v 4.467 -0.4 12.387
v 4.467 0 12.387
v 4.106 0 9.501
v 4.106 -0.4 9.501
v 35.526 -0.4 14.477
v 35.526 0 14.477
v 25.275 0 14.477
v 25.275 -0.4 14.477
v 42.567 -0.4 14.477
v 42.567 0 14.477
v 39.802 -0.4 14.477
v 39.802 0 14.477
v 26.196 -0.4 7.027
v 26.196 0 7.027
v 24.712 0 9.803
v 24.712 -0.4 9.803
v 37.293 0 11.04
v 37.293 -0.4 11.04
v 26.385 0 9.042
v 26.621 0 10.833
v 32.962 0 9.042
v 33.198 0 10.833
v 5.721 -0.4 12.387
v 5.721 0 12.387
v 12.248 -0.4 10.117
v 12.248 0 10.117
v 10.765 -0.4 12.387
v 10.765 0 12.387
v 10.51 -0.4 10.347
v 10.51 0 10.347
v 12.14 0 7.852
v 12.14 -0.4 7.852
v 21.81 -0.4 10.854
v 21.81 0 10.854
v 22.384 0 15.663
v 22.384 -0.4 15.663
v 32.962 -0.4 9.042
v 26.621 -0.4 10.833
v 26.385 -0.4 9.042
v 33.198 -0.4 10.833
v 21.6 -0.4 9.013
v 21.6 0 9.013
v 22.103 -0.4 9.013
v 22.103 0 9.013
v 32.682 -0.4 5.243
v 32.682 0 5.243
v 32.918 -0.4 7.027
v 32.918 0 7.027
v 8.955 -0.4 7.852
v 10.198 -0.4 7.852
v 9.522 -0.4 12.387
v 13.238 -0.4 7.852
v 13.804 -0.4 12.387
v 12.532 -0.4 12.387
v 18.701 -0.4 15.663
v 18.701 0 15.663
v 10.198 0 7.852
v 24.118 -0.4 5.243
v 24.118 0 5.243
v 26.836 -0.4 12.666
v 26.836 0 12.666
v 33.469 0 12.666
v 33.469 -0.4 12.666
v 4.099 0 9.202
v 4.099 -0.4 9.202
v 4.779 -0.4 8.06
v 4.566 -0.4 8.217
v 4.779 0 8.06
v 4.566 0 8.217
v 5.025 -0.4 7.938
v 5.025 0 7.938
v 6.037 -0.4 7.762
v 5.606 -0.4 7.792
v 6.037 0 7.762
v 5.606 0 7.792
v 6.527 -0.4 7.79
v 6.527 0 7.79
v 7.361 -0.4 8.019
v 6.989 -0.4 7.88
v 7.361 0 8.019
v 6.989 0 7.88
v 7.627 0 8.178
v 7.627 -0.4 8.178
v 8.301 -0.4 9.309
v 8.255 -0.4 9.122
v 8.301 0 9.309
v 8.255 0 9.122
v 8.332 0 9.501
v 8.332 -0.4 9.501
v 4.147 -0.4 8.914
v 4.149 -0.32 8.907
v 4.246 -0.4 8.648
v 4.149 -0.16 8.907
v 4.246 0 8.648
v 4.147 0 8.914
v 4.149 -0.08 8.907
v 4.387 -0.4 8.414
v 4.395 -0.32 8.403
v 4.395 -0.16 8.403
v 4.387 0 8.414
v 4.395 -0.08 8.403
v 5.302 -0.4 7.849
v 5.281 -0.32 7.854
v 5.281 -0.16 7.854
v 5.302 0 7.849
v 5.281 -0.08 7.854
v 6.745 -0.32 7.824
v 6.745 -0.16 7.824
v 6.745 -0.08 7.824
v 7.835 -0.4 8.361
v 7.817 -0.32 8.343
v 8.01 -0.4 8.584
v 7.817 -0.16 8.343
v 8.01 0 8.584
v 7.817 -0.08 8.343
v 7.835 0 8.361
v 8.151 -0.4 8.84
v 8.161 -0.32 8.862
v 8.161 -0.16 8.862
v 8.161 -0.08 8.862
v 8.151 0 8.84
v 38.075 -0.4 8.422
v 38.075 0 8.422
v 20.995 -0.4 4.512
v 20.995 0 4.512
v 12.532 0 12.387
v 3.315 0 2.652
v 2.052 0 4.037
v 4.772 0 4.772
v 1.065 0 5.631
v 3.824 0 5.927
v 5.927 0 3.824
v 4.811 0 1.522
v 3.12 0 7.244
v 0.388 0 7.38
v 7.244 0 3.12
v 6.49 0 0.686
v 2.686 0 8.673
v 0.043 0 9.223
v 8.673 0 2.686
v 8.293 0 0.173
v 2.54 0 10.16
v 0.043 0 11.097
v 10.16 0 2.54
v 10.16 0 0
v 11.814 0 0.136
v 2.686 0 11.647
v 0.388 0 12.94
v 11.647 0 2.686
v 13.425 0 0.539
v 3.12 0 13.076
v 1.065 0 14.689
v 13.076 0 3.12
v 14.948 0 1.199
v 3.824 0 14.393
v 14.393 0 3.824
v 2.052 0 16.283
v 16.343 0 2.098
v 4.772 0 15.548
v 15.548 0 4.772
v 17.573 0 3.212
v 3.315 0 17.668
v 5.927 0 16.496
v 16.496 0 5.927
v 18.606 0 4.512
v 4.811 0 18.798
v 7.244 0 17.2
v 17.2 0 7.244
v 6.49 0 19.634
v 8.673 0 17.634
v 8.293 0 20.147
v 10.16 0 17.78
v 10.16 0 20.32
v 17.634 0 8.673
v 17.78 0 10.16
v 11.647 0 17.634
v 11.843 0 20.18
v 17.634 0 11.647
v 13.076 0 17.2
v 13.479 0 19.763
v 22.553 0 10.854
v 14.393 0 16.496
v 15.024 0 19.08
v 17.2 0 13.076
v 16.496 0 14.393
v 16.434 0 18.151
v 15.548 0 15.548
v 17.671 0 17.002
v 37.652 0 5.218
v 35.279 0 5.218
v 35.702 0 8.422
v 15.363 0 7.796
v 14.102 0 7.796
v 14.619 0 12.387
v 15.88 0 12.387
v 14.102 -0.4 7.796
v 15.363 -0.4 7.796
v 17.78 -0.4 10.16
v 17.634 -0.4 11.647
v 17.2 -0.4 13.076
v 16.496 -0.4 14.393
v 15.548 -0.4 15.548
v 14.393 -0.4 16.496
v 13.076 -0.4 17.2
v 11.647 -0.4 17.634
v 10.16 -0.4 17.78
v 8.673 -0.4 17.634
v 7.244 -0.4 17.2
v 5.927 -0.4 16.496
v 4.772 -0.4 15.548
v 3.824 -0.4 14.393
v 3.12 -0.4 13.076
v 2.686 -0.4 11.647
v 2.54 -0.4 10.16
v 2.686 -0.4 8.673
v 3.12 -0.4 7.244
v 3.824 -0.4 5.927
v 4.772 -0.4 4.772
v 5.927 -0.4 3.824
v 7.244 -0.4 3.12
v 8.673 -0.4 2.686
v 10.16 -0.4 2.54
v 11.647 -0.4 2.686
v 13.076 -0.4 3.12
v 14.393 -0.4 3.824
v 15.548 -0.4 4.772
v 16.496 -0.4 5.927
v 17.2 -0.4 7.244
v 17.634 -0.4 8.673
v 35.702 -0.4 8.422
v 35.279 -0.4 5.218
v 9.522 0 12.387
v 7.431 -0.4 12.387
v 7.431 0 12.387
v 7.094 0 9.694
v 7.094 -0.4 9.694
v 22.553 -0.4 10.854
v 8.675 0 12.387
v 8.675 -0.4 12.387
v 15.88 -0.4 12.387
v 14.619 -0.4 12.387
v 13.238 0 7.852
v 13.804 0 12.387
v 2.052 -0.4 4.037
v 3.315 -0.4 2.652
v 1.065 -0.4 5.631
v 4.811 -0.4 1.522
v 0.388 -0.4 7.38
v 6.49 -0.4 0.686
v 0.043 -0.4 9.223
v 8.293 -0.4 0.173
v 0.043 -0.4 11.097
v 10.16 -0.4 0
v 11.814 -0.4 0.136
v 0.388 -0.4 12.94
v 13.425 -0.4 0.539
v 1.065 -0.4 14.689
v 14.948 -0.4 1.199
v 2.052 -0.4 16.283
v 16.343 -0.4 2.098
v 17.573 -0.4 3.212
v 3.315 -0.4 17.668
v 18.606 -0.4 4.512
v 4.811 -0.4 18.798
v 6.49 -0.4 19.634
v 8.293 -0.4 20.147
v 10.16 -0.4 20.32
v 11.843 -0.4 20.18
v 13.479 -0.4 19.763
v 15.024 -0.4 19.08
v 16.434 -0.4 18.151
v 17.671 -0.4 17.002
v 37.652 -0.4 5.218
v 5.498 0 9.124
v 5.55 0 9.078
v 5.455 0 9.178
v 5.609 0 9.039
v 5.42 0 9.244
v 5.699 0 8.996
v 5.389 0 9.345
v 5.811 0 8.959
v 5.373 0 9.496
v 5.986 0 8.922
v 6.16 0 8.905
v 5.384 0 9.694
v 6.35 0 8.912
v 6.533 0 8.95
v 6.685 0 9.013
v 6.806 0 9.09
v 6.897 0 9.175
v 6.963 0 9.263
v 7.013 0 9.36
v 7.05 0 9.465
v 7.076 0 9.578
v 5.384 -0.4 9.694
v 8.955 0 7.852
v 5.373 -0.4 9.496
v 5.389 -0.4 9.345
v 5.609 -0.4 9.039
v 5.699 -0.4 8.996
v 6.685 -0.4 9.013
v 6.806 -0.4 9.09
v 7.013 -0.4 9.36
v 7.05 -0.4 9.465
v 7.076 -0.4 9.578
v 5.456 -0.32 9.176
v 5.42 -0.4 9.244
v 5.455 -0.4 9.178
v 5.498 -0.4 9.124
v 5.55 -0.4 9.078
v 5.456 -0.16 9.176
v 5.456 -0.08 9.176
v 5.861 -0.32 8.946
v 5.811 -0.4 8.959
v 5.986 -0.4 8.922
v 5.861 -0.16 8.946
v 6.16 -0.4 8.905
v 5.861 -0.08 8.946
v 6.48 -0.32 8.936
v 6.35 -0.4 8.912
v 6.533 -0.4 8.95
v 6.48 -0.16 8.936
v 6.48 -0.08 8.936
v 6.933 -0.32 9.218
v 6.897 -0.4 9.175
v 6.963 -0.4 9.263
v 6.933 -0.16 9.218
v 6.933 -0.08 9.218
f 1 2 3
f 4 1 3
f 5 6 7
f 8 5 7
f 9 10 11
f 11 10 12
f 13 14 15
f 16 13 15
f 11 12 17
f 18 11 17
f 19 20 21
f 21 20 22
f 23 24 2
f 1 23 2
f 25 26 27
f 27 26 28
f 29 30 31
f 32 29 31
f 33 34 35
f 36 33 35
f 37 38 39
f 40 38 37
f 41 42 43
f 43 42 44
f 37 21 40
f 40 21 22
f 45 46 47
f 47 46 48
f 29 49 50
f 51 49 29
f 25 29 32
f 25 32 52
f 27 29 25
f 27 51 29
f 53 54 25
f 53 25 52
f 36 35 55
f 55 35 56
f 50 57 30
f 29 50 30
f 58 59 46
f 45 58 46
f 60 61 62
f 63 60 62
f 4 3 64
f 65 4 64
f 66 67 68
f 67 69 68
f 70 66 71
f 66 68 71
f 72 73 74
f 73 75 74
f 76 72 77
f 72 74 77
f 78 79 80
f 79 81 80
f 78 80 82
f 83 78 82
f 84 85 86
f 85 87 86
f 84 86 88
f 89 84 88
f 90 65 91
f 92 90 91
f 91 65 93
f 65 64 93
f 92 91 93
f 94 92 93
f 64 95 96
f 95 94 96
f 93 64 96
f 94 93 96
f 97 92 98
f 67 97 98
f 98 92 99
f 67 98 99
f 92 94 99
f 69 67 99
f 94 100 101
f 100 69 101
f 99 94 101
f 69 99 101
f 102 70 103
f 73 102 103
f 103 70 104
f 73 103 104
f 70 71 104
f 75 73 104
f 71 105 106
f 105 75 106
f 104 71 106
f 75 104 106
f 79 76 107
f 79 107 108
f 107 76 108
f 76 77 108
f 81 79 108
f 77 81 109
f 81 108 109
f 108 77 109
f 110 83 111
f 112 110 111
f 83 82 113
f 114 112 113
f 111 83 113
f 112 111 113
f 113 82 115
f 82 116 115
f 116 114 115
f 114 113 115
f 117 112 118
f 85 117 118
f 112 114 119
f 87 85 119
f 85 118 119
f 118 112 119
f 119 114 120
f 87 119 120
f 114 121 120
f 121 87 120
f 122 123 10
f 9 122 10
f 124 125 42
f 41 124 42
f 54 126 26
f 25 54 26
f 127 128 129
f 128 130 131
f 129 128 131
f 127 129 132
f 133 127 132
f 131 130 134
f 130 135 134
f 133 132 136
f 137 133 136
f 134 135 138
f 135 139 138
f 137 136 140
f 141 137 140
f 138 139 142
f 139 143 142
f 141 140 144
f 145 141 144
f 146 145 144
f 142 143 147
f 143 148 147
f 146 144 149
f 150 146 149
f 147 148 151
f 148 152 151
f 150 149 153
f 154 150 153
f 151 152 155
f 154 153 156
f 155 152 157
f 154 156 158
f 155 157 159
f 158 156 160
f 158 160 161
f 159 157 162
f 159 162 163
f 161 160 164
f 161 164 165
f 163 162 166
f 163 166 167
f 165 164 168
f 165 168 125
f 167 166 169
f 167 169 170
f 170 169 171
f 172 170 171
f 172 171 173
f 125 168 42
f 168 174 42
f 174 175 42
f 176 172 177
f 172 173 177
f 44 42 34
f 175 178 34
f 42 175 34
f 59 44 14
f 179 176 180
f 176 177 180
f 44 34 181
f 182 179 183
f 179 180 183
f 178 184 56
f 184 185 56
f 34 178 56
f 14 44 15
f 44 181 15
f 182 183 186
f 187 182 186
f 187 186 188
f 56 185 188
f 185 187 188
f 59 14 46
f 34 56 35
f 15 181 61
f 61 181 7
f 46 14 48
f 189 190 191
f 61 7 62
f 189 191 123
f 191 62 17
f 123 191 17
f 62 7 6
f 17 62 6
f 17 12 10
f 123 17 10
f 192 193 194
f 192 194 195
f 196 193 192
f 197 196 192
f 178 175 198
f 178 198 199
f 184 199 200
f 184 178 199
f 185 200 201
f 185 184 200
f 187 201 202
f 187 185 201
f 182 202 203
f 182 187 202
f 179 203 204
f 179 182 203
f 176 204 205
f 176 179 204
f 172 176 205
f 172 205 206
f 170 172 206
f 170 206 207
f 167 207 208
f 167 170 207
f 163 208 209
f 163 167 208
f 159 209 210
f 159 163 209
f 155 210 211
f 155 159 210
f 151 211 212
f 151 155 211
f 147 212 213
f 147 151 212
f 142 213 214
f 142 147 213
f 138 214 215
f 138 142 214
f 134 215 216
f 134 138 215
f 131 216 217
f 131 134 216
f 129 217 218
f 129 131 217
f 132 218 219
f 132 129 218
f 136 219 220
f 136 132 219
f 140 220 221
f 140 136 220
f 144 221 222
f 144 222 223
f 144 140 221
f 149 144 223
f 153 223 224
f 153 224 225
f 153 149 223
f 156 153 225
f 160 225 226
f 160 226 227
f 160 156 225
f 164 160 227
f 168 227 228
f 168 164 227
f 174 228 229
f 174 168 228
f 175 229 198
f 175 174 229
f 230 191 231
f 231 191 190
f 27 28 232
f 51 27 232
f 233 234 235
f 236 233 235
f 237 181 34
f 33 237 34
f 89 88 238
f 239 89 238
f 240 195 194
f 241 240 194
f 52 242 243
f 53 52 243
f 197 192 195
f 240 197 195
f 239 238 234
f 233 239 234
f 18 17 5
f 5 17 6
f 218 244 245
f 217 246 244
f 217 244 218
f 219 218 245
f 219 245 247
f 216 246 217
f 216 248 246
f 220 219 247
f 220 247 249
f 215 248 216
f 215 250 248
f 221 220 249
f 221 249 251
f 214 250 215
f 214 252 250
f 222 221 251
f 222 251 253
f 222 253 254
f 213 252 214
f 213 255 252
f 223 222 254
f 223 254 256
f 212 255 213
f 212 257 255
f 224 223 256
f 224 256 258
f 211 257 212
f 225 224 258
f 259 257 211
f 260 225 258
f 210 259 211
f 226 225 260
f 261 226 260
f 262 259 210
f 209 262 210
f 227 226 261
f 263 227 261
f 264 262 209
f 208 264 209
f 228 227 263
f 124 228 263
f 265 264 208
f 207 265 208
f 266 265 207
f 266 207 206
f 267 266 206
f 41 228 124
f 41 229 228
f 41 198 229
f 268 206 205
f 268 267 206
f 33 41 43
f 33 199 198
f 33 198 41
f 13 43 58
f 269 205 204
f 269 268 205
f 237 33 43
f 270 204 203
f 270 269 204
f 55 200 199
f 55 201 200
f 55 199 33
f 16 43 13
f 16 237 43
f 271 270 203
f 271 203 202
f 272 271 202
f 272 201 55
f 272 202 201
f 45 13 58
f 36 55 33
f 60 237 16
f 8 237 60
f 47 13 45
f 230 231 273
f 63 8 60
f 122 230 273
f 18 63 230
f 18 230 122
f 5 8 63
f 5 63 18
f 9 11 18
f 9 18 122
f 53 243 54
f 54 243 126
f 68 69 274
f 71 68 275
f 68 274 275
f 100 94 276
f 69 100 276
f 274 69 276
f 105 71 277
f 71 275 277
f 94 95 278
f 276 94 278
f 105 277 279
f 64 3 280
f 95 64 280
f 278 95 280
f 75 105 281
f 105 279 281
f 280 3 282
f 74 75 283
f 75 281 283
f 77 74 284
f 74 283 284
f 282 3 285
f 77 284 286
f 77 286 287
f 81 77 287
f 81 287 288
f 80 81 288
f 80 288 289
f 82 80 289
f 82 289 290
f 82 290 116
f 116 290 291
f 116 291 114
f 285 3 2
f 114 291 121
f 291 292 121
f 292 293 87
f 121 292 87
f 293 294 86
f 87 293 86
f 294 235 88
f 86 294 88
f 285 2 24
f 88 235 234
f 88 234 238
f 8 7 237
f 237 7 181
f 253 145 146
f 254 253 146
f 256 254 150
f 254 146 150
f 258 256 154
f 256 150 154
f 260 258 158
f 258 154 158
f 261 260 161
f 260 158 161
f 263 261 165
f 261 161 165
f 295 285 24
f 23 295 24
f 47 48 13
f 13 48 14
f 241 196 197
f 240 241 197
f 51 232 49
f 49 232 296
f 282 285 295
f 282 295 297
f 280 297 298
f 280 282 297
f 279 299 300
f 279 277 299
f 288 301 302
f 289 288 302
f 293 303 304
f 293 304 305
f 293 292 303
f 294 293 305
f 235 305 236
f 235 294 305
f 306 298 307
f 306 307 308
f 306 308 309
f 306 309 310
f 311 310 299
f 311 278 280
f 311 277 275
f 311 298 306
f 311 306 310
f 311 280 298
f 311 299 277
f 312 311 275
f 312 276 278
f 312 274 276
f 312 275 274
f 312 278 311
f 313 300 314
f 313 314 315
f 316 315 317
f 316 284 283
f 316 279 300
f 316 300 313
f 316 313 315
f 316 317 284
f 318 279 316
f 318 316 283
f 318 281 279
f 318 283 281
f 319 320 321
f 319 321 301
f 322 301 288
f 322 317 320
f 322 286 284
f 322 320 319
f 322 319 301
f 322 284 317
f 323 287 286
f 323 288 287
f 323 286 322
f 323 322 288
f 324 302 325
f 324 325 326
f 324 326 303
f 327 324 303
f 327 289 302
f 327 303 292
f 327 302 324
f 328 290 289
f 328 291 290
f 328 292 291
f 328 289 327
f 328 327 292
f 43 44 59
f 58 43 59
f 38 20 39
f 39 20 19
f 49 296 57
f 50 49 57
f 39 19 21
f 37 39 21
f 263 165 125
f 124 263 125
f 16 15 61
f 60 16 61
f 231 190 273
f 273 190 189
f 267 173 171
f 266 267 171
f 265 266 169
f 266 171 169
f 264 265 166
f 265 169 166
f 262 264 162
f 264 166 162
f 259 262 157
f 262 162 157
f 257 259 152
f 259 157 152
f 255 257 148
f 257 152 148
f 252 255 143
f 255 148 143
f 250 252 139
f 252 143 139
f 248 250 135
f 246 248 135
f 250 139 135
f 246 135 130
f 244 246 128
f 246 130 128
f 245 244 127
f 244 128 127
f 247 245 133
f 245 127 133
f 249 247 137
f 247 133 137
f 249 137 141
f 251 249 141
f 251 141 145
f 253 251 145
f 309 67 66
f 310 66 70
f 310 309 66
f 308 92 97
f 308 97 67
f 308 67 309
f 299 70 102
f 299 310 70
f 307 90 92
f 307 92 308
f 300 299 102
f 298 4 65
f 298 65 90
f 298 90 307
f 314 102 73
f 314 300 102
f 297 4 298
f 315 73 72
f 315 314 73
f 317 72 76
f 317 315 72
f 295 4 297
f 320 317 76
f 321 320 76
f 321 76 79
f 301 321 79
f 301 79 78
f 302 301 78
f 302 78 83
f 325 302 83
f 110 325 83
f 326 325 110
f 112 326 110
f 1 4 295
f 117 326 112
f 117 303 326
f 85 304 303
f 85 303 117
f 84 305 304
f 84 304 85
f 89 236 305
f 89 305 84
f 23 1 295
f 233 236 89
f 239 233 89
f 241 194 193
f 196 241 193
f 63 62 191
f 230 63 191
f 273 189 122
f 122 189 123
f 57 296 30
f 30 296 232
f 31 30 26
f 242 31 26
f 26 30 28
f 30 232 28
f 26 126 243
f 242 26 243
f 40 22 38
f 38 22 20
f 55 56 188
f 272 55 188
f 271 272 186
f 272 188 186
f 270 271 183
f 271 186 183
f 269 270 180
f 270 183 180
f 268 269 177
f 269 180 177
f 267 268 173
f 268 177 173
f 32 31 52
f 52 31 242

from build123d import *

# Parameters (mm, degrees)
F2_DEPTH = 1
F1_R     = 19.05
F3_SCALE = 0.4


with BuildPart() as f2:
    # F1 (on Front) → F2 (new body)
    with BuildSketch(Plane.XZ):
        Polygon((82.9961871263, 27.0818155259), (66.5535926819, 27.0818155259), (65.9620339516, 22.6049686938), (82.404628396, 22.6049686938), align=None)
    extrude(amount=F2_DEPTH)


with BuildPart() as f2b:
    # F1 (on Front) → F2, piece 2 (new body)
    with BuildSketch(Plane.XZ):
        with BuildLine():
            ThreePointArc((46.7516648161, 39.1574128956), (49.7669067213, 32.5703456566), (50.8, 25.4))
            ThreePointArc((50.8, 25.4), (49.7048843477, 18.0221549998), (46.5139687522, 11.2804984674))
            Line((46.5139687522, 11.2804984674), (52.4864755571, 11.2804984674))
            Line((52.4864755571, 11.2804984674), (53.9994613201, 22.5333180279))
            Line((53.9994613201, 22.5333180279), (55.2576243713, 22.5333180279))
            Line((55.2576243713, 22.5333180279), (60.2951698917, 13.1082339212))
            Line((60.2951698917, 13.1082339212), (81.7060988754, 13.1082339212))
            Line((81.7060988754, 13.1082339212), (82.295195533, 17.5664480776))
            Line((82.295195533, 17.5664480776), (65.4909238219, 17.5664480776))
            Line((65.4909238219, 17.5664480776), (61.780732125, 24.5080962777))
            Line((61.780732125, 24.5080962777), (67.0903518244, 31.6653137458))
            Line((67.0903518244, 31.6653137458), (83.6714297758, 31.6653137458))
            Line((83.6714297758, 31.6653137458), (89.2562275008, 21.0553194691))
            Line((89.2562275008, 21.0553194691), (88.1979187112, 13.0461631343))
            Line((88.1979187112, 13.0461631343), (94.1299913311, 13.0461631343))
            Line((94.1299913311, 13.0461631343), (95.1883001206, 21.0553194691))
            Line((95.1883001206, 21.0553194691), (106.4187288825, 36.1936204135))
            Line((106.4187288825, 36.1936204135), (99.5046484973, 36.1936204135))
            Line((99.5046484973, 36.1936204135), (93.2316854596, 27.6011060923))
            Line((93.2316854596, 27.6011060923), (88.8152111079, 36.1936204135))
            Line((88.8152111079, 36.1936204135), (63.1883591413, 36.1936204135))
            Line((63.1883591413, 36.1936204135), (56.3835725188, 27.1342098713))
            Line((56.3835725188, 27.1342098713), (54.5240081847, 27.1342098713))
            Line((54.5240081847, 27.1342098713), (55.960258209, 39.1574128956))
            Line((55.960258209, 39.1574128956), (46.7516648161, 39.1574128956))
        make_face()
        with BuildLine():
            ThreePointArc((46.5139687522, 11.2804984674), (49.7048843477, 18.0221549998), (50.8, 25.4))
            ThreePointArc((50.8, 25.4), (49.7669067213, 32.5703456566), (46.7516648161, 39.1574128956))
            ThreePointArc((46.7516648161, 39.1574128956), (37.5598049419, 47.7002050164), (25.4, 50.8))
            ThreePointArc((25.4, 50.8), (0, 25.4), (25.4, 0))
            ThreePointArc((25.4, 0), (37.369224308, 2.9969272316), (46.5139687522, 11.2804984674))
        make_face()
        with Locations((25.4, 25.4)):
            Circle(F1_R, mode=Mode.SUBTRACT)
    extrude(amount=F2_DEPTH)


with BuildPart() as f2c:
    # F1 (on Front) → F2, piece 3 (new body)
    with BuildSketch(Plane.XZ):
        Polygon((23.8046244951, 30.968748033), (22.3884135485, 19.6296200156), (25.4960613407, 19.6296200156), (26.2750982098, 25.867108018), (30.3509384394, 19.6296200156), (33.0948494375, 19.6296200156), (34.5110603841, 30.968748033), (31.3294984272, 30.968748033), (30.6206891305, 25.2935487457), (26.9122722874, 30.968748033), align=None)
    extrude(amount=F2_DEPTH)


with BuildPart() as f2d:
    # F1 (on Front) → F2, piece 4 (new body)
    with BuildSketch(Plane.XZ):
        with BuildLine():
            Line((20.8305145293, 23.7536086845), (21.6873288155, 30.968748033))
            Line((21.6873288155, 30.968748033), (18.5763090849, 30.968748033))
            Line((18.5763090849, 30.968748033), (17.7352244653, 24.2344644173))
            add(Edge.make_bspline(
                [(13.4605423235, 24.2344644173), (13.4004651698, 23.7534467142), (13.442377269, 22.8075392295), (14.6638588286, 22.2768183453), (16.217162271, 22.1857318889), (17.4776914113, 22.9427442388), (17.6813921624, 23.803447148), (17.7352244653, 24.2344644173)],
                knots=[0, 0, 0, 0, 0.1990339161, 0.3870519636, 0.6036244782, 0.8049251901, 1, 1, 1, 1], degree=3))
            Line((13.4605423235, 24.2344644173), (14.3016269431, 30.968748033))
            Line((14.3016269431, 30.968748033), (11.1668603495, 30.968748033))
            Line((11.1668603495, 30.968748033), (10.2657188057, 23.7536086845))
            add(Edge.make_bspline(
                [(10.2657188057, 23.7536086845), (10.1380010349, 22.7310151535), (10.727591852, 20.7721022488), (13.1601639773, 19.3592225237), (16.9069217065, 19.3258496174), (19.8142521895, 20.5617271867), (20.6970567317, 22.6297751743), (20.8305145293, 23.7536086845)],
                knots=[0, 0, 0, 0, 0.1932762379, 0.3783953082, 0.597878443, 0.7957637049, 1, 1, 1, 1], degree=3))
        make_face()
    extrude(amount=F2_DEPTH)


with BuildPart() as f2e:
    # F1 (on Front) → F2, piece 5 (new body)
    with BuildSketch(Plane.XZ):
        Polygon((39.7005101856, 30.968748033), (36.5480764028, 30.968748033), (35.2561064065, 19.489273097), (38.4085401893, 19.489273097), align=None)
    extrude(amount=F2_DEPTH)


with BuildPart() as f2d_1:
    # F3: moved
    add(f2d.part.scale(F3_SCALE))


with BuildPart() as f2e_1:
    # F3: moved
    add(f2e.part.scale(F3_SCALE))


with BuildPart() as f2c_1:
    # F3: moved
    add(f2c.part.scale(F3_SCALE))


with BuildPart() as f2_1:
    # F3: moved
    add(f2.part.scale(F3_SCALE))


with BuildPart() as f2b_1:
    # F3: moved
    add(f2b.part.scale(F3_SCALE))


solid = Compound([f2d_1.part, f2e_1.part, f2c_1.part, f2_1.part, f2b_1.part])
